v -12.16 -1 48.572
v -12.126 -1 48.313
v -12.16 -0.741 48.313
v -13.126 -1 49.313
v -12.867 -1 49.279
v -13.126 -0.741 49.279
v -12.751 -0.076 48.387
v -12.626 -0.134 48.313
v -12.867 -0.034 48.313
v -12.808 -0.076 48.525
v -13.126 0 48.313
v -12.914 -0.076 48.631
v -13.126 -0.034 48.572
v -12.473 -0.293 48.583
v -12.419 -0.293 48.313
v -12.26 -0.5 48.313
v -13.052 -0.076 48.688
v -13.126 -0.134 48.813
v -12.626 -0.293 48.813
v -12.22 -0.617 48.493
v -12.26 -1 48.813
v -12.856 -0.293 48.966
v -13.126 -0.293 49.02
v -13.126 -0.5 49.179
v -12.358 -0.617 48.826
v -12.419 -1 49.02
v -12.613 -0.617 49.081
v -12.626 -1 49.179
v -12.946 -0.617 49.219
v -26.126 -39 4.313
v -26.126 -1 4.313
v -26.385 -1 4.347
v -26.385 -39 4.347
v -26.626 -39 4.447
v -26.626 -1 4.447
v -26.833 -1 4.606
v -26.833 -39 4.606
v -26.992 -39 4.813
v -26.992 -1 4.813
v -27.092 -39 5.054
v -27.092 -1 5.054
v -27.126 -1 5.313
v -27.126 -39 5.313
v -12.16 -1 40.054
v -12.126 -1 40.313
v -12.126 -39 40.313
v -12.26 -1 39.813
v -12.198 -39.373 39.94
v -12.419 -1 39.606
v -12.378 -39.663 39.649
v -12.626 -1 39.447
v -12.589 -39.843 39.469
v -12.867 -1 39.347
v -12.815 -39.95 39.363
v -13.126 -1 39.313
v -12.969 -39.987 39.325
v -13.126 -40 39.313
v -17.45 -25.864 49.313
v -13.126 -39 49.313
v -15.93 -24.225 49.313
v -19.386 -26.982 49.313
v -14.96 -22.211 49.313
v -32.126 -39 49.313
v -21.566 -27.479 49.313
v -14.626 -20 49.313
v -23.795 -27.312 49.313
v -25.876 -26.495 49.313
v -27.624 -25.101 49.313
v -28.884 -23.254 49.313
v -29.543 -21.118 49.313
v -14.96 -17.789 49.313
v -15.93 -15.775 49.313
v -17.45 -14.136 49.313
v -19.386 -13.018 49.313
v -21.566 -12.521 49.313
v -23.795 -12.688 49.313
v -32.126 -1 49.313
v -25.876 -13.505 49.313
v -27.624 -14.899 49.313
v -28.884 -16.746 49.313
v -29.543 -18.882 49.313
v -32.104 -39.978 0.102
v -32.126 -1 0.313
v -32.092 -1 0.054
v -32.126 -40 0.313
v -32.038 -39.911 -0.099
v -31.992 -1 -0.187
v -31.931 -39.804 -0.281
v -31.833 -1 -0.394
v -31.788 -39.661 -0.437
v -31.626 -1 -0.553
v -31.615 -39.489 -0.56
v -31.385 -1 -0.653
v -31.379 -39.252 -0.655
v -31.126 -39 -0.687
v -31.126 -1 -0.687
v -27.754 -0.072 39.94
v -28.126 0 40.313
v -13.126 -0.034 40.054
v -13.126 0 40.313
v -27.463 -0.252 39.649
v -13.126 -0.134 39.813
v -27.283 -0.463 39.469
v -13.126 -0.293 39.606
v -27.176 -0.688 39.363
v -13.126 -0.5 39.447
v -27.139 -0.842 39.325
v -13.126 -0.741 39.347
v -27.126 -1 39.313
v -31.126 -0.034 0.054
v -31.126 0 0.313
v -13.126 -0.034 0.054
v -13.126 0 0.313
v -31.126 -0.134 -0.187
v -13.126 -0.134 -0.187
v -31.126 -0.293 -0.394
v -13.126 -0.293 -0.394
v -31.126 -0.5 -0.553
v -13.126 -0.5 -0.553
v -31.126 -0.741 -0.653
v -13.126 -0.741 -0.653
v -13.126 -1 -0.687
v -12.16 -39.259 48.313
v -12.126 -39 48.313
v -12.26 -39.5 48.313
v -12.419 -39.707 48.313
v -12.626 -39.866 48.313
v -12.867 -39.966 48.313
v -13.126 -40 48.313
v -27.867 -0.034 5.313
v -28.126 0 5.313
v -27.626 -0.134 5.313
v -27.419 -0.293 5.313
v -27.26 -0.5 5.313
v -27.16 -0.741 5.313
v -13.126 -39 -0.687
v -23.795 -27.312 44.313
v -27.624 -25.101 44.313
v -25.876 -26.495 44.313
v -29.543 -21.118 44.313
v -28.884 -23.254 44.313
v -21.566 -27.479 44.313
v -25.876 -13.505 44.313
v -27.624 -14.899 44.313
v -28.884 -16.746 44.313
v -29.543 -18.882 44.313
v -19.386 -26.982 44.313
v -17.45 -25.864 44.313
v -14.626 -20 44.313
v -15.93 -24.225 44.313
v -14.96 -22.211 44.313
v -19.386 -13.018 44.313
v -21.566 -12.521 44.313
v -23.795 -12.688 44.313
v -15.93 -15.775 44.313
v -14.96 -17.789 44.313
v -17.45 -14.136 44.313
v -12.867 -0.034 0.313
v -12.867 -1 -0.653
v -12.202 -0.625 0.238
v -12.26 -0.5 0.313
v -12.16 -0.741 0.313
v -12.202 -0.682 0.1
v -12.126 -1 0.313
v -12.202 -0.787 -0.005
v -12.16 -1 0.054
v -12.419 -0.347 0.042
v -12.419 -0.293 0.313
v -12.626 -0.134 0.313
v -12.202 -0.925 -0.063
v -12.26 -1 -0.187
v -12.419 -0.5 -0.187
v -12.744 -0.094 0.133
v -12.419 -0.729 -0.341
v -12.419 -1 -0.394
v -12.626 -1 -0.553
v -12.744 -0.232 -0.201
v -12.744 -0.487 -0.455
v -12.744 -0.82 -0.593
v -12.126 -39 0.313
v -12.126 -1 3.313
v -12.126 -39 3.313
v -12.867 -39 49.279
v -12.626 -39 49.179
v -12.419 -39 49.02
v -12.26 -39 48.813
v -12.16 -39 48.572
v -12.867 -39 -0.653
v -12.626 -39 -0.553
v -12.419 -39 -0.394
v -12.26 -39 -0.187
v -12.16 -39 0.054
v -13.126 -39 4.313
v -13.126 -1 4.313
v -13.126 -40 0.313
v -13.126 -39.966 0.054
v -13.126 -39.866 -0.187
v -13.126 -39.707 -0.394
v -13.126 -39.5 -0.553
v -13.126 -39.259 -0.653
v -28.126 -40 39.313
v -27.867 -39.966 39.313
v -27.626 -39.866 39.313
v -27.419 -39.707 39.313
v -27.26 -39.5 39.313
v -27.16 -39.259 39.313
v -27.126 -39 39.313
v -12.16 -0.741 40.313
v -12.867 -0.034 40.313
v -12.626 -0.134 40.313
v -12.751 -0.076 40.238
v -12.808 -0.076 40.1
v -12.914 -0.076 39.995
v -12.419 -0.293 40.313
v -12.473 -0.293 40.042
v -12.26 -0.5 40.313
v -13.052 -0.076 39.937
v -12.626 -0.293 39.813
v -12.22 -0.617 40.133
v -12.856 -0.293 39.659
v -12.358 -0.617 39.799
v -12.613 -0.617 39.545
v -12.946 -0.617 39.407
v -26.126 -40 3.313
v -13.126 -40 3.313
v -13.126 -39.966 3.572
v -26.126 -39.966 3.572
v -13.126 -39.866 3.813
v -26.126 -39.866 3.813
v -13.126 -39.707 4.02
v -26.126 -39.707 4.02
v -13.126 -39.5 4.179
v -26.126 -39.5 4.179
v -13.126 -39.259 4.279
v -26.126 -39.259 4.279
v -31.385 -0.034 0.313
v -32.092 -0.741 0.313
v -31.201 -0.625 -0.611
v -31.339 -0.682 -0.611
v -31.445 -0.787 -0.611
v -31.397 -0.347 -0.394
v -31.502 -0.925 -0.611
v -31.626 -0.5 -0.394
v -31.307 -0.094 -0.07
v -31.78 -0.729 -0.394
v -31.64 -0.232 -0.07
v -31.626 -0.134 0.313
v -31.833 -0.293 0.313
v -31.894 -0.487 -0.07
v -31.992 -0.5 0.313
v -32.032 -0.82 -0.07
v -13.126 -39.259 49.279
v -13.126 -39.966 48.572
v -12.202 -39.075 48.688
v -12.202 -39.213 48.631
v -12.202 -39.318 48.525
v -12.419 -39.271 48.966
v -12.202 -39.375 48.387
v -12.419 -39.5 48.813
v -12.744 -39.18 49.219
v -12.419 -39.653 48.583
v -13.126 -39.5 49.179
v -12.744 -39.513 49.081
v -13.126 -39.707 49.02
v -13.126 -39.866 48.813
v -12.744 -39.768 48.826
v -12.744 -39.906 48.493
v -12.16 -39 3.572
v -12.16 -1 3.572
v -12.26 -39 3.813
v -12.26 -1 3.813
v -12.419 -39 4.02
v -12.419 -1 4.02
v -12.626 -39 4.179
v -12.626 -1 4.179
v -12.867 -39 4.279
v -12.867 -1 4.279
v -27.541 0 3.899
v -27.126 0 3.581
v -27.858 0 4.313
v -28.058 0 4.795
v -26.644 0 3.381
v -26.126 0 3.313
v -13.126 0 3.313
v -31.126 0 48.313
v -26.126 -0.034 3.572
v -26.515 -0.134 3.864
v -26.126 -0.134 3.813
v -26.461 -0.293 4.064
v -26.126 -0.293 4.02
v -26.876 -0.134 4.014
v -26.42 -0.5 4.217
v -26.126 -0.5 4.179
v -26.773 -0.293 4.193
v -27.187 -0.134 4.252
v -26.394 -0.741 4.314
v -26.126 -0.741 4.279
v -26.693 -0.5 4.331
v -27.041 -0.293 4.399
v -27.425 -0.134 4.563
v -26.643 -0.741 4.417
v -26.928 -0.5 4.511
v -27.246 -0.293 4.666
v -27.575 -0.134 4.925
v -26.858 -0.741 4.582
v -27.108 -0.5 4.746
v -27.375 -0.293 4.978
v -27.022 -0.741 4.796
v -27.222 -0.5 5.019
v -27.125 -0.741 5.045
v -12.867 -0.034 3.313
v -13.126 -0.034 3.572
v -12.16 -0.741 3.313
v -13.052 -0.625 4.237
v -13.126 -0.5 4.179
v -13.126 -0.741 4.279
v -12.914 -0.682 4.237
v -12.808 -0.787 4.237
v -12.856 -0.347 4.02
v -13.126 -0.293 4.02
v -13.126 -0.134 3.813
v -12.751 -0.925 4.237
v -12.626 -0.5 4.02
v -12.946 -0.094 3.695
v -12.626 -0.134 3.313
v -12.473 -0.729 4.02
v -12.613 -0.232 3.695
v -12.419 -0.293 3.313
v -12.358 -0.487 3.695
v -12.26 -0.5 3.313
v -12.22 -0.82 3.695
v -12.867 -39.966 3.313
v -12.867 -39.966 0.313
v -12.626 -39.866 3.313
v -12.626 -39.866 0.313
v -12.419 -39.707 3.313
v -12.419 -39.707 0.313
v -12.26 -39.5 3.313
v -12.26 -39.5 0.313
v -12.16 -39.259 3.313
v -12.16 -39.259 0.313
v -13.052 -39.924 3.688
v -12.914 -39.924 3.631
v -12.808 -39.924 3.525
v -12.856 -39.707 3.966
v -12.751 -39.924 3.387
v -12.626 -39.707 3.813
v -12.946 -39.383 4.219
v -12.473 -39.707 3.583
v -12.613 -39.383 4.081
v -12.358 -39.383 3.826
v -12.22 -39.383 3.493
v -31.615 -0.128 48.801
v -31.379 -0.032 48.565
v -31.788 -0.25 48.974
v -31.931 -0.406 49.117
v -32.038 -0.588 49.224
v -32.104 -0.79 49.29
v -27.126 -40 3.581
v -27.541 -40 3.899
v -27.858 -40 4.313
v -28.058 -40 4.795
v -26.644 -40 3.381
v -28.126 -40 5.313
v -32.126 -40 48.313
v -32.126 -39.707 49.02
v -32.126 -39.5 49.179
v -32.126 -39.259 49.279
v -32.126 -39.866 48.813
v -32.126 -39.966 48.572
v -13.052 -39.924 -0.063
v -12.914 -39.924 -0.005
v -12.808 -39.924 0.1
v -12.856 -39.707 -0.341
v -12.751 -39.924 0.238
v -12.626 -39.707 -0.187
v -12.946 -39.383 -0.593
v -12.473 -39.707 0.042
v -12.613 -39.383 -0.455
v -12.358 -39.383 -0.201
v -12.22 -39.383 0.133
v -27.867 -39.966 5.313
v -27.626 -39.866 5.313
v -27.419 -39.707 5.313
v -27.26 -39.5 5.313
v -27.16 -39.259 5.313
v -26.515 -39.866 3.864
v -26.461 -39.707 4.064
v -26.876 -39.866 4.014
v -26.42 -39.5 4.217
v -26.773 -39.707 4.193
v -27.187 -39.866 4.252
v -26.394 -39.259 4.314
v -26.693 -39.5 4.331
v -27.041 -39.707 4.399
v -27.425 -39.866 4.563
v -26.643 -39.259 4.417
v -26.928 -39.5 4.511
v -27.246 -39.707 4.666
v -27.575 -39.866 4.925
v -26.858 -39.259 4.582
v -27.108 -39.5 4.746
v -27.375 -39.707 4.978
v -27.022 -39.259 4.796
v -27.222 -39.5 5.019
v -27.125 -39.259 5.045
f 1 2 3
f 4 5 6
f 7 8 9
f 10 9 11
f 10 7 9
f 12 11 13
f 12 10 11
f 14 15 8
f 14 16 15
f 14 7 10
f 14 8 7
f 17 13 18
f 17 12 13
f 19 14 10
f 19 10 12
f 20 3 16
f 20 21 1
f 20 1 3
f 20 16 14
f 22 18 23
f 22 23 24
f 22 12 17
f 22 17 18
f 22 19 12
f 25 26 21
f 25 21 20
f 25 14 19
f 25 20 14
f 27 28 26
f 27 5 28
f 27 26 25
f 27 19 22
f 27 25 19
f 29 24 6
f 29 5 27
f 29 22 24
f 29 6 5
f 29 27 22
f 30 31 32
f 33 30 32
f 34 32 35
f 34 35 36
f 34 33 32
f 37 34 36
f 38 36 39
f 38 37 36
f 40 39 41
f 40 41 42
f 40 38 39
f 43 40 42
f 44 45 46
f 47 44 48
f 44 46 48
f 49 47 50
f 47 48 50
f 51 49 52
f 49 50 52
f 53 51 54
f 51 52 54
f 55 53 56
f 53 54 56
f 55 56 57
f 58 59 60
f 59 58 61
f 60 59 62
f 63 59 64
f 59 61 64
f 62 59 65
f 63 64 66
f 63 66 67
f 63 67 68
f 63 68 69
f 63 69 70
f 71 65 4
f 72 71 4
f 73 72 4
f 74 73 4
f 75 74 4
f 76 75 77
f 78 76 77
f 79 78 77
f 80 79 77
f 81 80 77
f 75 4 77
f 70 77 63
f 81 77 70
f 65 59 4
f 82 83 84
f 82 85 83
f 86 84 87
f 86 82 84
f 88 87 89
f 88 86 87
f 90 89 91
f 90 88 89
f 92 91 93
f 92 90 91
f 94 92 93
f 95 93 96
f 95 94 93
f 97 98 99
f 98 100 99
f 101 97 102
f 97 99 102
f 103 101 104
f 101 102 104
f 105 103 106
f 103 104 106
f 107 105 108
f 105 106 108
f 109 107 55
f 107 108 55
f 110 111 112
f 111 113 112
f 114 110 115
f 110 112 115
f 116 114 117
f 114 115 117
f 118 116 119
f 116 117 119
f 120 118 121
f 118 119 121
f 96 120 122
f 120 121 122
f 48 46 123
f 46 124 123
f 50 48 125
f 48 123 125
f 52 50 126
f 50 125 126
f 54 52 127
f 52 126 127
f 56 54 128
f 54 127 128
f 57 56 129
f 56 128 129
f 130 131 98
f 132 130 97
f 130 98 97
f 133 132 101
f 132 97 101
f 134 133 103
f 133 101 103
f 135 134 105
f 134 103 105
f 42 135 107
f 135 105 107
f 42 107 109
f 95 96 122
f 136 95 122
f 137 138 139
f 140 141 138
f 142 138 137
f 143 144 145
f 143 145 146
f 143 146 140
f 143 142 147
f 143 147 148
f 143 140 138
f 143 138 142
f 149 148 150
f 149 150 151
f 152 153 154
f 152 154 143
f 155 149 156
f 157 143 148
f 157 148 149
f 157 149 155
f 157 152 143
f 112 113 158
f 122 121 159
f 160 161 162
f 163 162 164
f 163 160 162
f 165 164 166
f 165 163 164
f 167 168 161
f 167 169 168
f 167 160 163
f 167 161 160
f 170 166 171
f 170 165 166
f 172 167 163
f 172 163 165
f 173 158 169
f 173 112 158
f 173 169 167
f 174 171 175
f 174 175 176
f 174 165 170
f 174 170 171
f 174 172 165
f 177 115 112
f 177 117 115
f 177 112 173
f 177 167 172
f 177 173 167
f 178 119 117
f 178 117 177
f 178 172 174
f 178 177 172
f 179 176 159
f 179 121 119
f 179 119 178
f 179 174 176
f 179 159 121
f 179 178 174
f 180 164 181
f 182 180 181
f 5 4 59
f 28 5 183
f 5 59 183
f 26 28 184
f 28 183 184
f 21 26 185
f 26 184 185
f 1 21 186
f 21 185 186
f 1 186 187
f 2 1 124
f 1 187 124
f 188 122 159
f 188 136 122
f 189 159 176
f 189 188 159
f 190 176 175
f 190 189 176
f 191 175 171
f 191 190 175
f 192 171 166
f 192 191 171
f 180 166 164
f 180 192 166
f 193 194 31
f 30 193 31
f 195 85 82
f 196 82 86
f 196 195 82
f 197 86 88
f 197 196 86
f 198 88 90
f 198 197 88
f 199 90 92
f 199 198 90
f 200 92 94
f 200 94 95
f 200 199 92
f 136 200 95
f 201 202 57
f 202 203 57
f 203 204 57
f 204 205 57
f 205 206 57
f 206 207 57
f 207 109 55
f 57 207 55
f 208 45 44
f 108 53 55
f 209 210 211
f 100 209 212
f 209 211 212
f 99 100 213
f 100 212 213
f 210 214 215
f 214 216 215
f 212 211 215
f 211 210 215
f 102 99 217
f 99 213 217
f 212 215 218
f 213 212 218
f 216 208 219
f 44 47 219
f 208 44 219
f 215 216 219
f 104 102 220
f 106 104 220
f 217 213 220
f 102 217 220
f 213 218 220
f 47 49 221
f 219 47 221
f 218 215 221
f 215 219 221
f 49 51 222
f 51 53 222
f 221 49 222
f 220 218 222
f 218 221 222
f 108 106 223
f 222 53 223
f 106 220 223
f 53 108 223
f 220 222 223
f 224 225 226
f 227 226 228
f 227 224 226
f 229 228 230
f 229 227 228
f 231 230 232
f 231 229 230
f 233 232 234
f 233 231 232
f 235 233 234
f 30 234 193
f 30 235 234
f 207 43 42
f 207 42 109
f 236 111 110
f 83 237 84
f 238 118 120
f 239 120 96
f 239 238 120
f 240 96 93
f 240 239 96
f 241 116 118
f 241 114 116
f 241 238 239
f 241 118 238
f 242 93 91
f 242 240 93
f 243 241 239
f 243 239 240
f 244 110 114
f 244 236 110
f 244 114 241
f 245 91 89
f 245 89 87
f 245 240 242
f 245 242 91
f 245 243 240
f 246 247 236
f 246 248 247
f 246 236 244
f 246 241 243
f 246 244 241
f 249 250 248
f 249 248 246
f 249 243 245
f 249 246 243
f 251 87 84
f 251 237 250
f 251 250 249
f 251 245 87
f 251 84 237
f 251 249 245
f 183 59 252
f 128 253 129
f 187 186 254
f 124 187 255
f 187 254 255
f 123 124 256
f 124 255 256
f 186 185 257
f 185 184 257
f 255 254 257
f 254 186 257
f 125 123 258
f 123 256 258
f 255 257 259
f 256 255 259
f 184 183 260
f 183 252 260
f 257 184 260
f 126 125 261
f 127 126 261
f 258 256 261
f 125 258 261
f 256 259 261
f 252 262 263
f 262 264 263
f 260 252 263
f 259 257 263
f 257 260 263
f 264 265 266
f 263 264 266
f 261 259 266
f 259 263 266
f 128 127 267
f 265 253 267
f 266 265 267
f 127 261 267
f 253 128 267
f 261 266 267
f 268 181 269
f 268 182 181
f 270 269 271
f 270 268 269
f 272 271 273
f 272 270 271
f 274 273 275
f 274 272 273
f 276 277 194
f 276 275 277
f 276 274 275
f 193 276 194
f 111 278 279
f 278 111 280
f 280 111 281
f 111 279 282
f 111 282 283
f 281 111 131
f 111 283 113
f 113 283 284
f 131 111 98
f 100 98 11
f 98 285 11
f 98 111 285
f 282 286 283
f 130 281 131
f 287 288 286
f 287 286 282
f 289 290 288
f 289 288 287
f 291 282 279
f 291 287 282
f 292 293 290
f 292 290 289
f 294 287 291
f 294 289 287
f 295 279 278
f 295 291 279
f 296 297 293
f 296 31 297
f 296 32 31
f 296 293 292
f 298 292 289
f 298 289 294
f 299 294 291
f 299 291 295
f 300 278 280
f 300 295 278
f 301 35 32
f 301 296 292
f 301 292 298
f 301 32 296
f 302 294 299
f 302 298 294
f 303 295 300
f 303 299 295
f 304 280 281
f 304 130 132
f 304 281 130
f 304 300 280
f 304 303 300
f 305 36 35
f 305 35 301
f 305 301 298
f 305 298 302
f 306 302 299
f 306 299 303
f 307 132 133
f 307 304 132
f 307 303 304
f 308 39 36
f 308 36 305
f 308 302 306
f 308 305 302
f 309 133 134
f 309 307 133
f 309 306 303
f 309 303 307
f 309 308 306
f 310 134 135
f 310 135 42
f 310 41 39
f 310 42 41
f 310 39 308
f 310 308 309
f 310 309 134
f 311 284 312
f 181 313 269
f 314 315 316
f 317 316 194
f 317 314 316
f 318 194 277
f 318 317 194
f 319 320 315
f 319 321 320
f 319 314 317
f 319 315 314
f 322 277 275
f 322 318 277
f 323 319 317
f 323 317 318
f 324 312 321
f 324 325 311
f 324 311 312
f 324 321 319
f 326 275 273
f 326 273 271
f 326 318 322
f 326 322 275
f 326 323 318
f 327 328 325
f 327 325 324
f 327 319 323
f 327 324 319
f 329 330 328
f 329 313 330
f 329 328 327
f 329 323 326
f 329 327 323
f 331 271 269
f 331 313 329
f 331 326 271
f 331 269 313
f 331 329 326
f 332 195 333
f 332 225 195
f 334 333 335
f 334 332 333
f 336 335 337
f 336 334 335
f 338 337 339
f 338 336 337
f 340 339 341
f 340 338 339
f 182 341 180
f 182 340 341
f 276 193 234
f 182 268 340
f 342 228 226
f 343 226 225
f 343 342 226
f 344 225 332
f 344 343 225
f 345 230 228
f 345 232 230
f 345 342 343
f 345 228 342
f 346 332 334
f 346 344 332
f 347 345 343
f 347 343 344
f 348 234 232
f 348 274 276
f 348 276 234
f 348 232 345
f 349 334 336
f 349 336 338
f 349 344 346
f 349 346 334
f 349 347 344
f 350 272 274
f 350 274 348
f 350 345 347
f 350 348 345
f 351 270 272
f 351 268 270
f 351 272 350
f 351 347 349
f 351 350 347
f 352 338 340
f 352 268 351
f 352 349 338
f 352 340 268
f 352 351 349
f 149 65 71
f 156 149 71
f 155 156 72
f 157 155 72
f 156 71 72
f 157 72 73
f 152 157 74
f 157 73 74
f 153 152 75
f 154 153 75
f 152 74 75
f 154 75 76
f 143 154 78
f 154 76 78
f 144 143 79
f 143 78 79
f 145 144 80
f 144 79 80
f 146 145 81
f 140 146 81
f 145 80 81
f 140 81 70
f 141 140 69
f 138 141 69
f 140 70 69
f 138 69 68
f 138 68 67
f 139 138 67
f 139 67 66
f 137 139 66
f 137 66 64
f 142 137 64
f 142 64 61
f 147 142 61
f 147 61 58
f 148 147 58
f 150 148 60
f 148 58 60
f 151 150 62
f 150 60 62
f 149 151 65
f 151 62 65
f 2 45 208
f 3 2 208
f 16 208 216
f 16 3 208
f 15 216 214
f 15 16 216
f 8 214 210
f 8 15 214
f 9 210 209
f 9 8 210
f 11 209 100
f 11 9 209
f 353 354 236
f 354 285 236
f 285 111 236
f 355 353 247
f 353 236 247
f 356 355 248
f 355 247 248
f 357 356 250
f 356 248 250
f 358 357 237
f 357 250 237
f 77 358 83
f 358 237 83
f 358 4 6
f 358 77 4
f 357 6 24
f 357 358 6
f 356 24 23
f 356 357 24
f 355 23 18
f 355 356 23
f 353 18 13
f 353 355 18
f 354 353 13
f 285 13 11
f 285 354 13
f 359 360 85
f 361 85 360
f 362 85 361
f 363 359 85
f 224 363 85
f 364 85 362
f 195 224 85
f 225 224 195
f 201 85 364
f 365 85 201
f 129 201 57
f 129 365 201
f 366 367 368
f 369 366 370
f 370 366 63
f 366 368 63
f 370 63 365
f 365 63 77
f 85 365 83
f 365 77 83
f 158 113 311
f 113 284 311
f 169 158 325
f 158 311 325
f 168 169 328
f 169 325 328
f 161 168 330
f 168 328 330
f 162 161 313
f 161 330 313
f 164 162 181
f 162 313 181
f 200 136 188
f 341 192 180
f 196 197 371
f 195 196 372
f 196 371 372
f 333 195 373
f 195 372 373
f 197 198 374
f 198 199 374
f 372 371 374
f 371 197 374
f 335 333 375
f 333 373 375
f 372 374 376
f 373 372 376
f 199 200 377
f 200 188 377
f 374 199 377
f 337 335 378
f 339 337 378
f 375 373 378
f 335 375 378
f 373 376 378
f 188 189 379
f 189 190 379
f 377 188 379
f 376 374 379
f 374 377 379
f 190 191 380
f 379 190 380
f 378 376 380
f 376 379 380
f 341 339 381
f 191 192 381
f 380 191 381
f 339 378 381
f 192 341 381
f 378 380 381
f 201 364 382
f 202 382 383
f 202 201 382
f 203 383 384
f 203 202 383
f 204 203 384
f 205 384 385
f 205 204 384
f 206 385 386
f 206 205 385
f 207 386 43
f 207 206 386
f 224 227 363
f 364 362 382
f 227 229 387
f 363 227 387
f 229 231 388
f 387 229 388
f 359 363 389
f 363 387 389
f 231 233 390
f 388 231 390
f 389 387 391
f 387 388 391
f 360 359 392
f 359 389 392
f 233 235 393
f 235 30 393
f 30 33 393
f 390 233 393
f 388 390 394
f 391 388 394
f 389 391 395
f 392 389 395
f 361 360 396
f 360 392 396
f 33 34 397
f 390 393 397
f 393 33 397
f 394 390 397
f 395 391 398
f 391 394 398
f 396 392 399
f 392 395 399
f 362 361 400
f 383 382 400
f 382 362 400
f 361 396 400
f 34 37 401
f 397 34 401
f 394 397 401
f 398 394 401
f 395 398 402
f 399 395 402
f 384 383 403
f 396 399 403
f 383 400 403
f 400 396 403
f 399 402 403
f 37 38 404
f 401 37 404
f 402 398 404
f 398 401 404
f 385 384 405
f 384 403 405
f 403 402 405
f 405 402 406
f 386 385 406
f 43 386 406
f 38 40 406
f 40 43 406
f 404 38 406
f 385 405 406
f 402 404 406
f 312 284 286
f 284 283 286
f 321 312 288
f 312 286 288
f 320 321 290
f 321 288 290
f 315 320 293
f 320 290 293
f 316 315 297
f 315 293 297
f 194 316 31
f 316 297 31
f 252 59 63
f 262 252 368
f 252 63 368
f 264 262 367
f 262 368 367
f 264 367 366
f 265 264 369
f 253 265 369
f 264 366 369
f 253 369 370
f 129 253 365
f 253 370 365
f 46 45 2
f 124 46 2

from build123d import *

# Parameters (mm, degrees)
F1_DEPTH = 40
F2_R     = 7.5
F3_DEPTH = 5
F4_R     = 1


with BuildPart() as f1:
    # F0 (on Front) → F1 (new body)
    with BuildSketch(Plane.XZ):
        Polygon((-12.1263185228, 49.3127419949), (-32.1263185228, 49.3127419949), (-32.1263185228, -0.6872580051), (-12.1263185228, -0.6872580051), (-12.1263185228, 4.3127419949), (-27.1263185228, 4.3127419949), (-27.1263185228, 39.3127419949), (-12.1263185228, 39.3127419949), align=None)
    extrude(amount=F1_DEPTH)

    # F2 (on face) → F3 (cut)
    with BuildSketch(Plane.XY.offset(49.3127419949)):
        with Locations((-22.1263185228, -20)):
            Circle(F2_R)
    extrude(amount=-F3_DEPTH, mode=Mode.SUBTRACT)

    # F4
    f4_edges = [f1.edges().sort_by_distance(p)[0] for p in [
        (-22.126319, -40, 49.312742),
        (-12.126319, -20, 39.312742),
        (-12.126319, -20, 49.312742),
        (-12.126319, 0, 44.312742),
        (-12.126319, -40, 44.312742),
        (-22.126319, 0, 49.312742),
        (-32.126319, 0, 24.312742),
        (-22.126319, 0, -0.687258),
        (-12.126319, 0, 1.812742),
        (-19.626319, 0, 4.312742),
        (-27.126319, 0, 21.812742),
        (-19.626319, 0, 39.312742),
        (-12.126319, -20, 4.312742),
        (-27.126319, -20, 4.312742),
        (-19.626319, -40, 4.312742),
        (-32.126319, -20, -0.687258),
        (-12.126319, -20, -0.687258),
        (-22.126319, -40, -0.687258),
        (-12.126319, -40, 1.812742),
        (-27.126319, -40, 21.812742),
    ]]
    fillet(f4_edges, radius=F4_R)


solid = f1.part
